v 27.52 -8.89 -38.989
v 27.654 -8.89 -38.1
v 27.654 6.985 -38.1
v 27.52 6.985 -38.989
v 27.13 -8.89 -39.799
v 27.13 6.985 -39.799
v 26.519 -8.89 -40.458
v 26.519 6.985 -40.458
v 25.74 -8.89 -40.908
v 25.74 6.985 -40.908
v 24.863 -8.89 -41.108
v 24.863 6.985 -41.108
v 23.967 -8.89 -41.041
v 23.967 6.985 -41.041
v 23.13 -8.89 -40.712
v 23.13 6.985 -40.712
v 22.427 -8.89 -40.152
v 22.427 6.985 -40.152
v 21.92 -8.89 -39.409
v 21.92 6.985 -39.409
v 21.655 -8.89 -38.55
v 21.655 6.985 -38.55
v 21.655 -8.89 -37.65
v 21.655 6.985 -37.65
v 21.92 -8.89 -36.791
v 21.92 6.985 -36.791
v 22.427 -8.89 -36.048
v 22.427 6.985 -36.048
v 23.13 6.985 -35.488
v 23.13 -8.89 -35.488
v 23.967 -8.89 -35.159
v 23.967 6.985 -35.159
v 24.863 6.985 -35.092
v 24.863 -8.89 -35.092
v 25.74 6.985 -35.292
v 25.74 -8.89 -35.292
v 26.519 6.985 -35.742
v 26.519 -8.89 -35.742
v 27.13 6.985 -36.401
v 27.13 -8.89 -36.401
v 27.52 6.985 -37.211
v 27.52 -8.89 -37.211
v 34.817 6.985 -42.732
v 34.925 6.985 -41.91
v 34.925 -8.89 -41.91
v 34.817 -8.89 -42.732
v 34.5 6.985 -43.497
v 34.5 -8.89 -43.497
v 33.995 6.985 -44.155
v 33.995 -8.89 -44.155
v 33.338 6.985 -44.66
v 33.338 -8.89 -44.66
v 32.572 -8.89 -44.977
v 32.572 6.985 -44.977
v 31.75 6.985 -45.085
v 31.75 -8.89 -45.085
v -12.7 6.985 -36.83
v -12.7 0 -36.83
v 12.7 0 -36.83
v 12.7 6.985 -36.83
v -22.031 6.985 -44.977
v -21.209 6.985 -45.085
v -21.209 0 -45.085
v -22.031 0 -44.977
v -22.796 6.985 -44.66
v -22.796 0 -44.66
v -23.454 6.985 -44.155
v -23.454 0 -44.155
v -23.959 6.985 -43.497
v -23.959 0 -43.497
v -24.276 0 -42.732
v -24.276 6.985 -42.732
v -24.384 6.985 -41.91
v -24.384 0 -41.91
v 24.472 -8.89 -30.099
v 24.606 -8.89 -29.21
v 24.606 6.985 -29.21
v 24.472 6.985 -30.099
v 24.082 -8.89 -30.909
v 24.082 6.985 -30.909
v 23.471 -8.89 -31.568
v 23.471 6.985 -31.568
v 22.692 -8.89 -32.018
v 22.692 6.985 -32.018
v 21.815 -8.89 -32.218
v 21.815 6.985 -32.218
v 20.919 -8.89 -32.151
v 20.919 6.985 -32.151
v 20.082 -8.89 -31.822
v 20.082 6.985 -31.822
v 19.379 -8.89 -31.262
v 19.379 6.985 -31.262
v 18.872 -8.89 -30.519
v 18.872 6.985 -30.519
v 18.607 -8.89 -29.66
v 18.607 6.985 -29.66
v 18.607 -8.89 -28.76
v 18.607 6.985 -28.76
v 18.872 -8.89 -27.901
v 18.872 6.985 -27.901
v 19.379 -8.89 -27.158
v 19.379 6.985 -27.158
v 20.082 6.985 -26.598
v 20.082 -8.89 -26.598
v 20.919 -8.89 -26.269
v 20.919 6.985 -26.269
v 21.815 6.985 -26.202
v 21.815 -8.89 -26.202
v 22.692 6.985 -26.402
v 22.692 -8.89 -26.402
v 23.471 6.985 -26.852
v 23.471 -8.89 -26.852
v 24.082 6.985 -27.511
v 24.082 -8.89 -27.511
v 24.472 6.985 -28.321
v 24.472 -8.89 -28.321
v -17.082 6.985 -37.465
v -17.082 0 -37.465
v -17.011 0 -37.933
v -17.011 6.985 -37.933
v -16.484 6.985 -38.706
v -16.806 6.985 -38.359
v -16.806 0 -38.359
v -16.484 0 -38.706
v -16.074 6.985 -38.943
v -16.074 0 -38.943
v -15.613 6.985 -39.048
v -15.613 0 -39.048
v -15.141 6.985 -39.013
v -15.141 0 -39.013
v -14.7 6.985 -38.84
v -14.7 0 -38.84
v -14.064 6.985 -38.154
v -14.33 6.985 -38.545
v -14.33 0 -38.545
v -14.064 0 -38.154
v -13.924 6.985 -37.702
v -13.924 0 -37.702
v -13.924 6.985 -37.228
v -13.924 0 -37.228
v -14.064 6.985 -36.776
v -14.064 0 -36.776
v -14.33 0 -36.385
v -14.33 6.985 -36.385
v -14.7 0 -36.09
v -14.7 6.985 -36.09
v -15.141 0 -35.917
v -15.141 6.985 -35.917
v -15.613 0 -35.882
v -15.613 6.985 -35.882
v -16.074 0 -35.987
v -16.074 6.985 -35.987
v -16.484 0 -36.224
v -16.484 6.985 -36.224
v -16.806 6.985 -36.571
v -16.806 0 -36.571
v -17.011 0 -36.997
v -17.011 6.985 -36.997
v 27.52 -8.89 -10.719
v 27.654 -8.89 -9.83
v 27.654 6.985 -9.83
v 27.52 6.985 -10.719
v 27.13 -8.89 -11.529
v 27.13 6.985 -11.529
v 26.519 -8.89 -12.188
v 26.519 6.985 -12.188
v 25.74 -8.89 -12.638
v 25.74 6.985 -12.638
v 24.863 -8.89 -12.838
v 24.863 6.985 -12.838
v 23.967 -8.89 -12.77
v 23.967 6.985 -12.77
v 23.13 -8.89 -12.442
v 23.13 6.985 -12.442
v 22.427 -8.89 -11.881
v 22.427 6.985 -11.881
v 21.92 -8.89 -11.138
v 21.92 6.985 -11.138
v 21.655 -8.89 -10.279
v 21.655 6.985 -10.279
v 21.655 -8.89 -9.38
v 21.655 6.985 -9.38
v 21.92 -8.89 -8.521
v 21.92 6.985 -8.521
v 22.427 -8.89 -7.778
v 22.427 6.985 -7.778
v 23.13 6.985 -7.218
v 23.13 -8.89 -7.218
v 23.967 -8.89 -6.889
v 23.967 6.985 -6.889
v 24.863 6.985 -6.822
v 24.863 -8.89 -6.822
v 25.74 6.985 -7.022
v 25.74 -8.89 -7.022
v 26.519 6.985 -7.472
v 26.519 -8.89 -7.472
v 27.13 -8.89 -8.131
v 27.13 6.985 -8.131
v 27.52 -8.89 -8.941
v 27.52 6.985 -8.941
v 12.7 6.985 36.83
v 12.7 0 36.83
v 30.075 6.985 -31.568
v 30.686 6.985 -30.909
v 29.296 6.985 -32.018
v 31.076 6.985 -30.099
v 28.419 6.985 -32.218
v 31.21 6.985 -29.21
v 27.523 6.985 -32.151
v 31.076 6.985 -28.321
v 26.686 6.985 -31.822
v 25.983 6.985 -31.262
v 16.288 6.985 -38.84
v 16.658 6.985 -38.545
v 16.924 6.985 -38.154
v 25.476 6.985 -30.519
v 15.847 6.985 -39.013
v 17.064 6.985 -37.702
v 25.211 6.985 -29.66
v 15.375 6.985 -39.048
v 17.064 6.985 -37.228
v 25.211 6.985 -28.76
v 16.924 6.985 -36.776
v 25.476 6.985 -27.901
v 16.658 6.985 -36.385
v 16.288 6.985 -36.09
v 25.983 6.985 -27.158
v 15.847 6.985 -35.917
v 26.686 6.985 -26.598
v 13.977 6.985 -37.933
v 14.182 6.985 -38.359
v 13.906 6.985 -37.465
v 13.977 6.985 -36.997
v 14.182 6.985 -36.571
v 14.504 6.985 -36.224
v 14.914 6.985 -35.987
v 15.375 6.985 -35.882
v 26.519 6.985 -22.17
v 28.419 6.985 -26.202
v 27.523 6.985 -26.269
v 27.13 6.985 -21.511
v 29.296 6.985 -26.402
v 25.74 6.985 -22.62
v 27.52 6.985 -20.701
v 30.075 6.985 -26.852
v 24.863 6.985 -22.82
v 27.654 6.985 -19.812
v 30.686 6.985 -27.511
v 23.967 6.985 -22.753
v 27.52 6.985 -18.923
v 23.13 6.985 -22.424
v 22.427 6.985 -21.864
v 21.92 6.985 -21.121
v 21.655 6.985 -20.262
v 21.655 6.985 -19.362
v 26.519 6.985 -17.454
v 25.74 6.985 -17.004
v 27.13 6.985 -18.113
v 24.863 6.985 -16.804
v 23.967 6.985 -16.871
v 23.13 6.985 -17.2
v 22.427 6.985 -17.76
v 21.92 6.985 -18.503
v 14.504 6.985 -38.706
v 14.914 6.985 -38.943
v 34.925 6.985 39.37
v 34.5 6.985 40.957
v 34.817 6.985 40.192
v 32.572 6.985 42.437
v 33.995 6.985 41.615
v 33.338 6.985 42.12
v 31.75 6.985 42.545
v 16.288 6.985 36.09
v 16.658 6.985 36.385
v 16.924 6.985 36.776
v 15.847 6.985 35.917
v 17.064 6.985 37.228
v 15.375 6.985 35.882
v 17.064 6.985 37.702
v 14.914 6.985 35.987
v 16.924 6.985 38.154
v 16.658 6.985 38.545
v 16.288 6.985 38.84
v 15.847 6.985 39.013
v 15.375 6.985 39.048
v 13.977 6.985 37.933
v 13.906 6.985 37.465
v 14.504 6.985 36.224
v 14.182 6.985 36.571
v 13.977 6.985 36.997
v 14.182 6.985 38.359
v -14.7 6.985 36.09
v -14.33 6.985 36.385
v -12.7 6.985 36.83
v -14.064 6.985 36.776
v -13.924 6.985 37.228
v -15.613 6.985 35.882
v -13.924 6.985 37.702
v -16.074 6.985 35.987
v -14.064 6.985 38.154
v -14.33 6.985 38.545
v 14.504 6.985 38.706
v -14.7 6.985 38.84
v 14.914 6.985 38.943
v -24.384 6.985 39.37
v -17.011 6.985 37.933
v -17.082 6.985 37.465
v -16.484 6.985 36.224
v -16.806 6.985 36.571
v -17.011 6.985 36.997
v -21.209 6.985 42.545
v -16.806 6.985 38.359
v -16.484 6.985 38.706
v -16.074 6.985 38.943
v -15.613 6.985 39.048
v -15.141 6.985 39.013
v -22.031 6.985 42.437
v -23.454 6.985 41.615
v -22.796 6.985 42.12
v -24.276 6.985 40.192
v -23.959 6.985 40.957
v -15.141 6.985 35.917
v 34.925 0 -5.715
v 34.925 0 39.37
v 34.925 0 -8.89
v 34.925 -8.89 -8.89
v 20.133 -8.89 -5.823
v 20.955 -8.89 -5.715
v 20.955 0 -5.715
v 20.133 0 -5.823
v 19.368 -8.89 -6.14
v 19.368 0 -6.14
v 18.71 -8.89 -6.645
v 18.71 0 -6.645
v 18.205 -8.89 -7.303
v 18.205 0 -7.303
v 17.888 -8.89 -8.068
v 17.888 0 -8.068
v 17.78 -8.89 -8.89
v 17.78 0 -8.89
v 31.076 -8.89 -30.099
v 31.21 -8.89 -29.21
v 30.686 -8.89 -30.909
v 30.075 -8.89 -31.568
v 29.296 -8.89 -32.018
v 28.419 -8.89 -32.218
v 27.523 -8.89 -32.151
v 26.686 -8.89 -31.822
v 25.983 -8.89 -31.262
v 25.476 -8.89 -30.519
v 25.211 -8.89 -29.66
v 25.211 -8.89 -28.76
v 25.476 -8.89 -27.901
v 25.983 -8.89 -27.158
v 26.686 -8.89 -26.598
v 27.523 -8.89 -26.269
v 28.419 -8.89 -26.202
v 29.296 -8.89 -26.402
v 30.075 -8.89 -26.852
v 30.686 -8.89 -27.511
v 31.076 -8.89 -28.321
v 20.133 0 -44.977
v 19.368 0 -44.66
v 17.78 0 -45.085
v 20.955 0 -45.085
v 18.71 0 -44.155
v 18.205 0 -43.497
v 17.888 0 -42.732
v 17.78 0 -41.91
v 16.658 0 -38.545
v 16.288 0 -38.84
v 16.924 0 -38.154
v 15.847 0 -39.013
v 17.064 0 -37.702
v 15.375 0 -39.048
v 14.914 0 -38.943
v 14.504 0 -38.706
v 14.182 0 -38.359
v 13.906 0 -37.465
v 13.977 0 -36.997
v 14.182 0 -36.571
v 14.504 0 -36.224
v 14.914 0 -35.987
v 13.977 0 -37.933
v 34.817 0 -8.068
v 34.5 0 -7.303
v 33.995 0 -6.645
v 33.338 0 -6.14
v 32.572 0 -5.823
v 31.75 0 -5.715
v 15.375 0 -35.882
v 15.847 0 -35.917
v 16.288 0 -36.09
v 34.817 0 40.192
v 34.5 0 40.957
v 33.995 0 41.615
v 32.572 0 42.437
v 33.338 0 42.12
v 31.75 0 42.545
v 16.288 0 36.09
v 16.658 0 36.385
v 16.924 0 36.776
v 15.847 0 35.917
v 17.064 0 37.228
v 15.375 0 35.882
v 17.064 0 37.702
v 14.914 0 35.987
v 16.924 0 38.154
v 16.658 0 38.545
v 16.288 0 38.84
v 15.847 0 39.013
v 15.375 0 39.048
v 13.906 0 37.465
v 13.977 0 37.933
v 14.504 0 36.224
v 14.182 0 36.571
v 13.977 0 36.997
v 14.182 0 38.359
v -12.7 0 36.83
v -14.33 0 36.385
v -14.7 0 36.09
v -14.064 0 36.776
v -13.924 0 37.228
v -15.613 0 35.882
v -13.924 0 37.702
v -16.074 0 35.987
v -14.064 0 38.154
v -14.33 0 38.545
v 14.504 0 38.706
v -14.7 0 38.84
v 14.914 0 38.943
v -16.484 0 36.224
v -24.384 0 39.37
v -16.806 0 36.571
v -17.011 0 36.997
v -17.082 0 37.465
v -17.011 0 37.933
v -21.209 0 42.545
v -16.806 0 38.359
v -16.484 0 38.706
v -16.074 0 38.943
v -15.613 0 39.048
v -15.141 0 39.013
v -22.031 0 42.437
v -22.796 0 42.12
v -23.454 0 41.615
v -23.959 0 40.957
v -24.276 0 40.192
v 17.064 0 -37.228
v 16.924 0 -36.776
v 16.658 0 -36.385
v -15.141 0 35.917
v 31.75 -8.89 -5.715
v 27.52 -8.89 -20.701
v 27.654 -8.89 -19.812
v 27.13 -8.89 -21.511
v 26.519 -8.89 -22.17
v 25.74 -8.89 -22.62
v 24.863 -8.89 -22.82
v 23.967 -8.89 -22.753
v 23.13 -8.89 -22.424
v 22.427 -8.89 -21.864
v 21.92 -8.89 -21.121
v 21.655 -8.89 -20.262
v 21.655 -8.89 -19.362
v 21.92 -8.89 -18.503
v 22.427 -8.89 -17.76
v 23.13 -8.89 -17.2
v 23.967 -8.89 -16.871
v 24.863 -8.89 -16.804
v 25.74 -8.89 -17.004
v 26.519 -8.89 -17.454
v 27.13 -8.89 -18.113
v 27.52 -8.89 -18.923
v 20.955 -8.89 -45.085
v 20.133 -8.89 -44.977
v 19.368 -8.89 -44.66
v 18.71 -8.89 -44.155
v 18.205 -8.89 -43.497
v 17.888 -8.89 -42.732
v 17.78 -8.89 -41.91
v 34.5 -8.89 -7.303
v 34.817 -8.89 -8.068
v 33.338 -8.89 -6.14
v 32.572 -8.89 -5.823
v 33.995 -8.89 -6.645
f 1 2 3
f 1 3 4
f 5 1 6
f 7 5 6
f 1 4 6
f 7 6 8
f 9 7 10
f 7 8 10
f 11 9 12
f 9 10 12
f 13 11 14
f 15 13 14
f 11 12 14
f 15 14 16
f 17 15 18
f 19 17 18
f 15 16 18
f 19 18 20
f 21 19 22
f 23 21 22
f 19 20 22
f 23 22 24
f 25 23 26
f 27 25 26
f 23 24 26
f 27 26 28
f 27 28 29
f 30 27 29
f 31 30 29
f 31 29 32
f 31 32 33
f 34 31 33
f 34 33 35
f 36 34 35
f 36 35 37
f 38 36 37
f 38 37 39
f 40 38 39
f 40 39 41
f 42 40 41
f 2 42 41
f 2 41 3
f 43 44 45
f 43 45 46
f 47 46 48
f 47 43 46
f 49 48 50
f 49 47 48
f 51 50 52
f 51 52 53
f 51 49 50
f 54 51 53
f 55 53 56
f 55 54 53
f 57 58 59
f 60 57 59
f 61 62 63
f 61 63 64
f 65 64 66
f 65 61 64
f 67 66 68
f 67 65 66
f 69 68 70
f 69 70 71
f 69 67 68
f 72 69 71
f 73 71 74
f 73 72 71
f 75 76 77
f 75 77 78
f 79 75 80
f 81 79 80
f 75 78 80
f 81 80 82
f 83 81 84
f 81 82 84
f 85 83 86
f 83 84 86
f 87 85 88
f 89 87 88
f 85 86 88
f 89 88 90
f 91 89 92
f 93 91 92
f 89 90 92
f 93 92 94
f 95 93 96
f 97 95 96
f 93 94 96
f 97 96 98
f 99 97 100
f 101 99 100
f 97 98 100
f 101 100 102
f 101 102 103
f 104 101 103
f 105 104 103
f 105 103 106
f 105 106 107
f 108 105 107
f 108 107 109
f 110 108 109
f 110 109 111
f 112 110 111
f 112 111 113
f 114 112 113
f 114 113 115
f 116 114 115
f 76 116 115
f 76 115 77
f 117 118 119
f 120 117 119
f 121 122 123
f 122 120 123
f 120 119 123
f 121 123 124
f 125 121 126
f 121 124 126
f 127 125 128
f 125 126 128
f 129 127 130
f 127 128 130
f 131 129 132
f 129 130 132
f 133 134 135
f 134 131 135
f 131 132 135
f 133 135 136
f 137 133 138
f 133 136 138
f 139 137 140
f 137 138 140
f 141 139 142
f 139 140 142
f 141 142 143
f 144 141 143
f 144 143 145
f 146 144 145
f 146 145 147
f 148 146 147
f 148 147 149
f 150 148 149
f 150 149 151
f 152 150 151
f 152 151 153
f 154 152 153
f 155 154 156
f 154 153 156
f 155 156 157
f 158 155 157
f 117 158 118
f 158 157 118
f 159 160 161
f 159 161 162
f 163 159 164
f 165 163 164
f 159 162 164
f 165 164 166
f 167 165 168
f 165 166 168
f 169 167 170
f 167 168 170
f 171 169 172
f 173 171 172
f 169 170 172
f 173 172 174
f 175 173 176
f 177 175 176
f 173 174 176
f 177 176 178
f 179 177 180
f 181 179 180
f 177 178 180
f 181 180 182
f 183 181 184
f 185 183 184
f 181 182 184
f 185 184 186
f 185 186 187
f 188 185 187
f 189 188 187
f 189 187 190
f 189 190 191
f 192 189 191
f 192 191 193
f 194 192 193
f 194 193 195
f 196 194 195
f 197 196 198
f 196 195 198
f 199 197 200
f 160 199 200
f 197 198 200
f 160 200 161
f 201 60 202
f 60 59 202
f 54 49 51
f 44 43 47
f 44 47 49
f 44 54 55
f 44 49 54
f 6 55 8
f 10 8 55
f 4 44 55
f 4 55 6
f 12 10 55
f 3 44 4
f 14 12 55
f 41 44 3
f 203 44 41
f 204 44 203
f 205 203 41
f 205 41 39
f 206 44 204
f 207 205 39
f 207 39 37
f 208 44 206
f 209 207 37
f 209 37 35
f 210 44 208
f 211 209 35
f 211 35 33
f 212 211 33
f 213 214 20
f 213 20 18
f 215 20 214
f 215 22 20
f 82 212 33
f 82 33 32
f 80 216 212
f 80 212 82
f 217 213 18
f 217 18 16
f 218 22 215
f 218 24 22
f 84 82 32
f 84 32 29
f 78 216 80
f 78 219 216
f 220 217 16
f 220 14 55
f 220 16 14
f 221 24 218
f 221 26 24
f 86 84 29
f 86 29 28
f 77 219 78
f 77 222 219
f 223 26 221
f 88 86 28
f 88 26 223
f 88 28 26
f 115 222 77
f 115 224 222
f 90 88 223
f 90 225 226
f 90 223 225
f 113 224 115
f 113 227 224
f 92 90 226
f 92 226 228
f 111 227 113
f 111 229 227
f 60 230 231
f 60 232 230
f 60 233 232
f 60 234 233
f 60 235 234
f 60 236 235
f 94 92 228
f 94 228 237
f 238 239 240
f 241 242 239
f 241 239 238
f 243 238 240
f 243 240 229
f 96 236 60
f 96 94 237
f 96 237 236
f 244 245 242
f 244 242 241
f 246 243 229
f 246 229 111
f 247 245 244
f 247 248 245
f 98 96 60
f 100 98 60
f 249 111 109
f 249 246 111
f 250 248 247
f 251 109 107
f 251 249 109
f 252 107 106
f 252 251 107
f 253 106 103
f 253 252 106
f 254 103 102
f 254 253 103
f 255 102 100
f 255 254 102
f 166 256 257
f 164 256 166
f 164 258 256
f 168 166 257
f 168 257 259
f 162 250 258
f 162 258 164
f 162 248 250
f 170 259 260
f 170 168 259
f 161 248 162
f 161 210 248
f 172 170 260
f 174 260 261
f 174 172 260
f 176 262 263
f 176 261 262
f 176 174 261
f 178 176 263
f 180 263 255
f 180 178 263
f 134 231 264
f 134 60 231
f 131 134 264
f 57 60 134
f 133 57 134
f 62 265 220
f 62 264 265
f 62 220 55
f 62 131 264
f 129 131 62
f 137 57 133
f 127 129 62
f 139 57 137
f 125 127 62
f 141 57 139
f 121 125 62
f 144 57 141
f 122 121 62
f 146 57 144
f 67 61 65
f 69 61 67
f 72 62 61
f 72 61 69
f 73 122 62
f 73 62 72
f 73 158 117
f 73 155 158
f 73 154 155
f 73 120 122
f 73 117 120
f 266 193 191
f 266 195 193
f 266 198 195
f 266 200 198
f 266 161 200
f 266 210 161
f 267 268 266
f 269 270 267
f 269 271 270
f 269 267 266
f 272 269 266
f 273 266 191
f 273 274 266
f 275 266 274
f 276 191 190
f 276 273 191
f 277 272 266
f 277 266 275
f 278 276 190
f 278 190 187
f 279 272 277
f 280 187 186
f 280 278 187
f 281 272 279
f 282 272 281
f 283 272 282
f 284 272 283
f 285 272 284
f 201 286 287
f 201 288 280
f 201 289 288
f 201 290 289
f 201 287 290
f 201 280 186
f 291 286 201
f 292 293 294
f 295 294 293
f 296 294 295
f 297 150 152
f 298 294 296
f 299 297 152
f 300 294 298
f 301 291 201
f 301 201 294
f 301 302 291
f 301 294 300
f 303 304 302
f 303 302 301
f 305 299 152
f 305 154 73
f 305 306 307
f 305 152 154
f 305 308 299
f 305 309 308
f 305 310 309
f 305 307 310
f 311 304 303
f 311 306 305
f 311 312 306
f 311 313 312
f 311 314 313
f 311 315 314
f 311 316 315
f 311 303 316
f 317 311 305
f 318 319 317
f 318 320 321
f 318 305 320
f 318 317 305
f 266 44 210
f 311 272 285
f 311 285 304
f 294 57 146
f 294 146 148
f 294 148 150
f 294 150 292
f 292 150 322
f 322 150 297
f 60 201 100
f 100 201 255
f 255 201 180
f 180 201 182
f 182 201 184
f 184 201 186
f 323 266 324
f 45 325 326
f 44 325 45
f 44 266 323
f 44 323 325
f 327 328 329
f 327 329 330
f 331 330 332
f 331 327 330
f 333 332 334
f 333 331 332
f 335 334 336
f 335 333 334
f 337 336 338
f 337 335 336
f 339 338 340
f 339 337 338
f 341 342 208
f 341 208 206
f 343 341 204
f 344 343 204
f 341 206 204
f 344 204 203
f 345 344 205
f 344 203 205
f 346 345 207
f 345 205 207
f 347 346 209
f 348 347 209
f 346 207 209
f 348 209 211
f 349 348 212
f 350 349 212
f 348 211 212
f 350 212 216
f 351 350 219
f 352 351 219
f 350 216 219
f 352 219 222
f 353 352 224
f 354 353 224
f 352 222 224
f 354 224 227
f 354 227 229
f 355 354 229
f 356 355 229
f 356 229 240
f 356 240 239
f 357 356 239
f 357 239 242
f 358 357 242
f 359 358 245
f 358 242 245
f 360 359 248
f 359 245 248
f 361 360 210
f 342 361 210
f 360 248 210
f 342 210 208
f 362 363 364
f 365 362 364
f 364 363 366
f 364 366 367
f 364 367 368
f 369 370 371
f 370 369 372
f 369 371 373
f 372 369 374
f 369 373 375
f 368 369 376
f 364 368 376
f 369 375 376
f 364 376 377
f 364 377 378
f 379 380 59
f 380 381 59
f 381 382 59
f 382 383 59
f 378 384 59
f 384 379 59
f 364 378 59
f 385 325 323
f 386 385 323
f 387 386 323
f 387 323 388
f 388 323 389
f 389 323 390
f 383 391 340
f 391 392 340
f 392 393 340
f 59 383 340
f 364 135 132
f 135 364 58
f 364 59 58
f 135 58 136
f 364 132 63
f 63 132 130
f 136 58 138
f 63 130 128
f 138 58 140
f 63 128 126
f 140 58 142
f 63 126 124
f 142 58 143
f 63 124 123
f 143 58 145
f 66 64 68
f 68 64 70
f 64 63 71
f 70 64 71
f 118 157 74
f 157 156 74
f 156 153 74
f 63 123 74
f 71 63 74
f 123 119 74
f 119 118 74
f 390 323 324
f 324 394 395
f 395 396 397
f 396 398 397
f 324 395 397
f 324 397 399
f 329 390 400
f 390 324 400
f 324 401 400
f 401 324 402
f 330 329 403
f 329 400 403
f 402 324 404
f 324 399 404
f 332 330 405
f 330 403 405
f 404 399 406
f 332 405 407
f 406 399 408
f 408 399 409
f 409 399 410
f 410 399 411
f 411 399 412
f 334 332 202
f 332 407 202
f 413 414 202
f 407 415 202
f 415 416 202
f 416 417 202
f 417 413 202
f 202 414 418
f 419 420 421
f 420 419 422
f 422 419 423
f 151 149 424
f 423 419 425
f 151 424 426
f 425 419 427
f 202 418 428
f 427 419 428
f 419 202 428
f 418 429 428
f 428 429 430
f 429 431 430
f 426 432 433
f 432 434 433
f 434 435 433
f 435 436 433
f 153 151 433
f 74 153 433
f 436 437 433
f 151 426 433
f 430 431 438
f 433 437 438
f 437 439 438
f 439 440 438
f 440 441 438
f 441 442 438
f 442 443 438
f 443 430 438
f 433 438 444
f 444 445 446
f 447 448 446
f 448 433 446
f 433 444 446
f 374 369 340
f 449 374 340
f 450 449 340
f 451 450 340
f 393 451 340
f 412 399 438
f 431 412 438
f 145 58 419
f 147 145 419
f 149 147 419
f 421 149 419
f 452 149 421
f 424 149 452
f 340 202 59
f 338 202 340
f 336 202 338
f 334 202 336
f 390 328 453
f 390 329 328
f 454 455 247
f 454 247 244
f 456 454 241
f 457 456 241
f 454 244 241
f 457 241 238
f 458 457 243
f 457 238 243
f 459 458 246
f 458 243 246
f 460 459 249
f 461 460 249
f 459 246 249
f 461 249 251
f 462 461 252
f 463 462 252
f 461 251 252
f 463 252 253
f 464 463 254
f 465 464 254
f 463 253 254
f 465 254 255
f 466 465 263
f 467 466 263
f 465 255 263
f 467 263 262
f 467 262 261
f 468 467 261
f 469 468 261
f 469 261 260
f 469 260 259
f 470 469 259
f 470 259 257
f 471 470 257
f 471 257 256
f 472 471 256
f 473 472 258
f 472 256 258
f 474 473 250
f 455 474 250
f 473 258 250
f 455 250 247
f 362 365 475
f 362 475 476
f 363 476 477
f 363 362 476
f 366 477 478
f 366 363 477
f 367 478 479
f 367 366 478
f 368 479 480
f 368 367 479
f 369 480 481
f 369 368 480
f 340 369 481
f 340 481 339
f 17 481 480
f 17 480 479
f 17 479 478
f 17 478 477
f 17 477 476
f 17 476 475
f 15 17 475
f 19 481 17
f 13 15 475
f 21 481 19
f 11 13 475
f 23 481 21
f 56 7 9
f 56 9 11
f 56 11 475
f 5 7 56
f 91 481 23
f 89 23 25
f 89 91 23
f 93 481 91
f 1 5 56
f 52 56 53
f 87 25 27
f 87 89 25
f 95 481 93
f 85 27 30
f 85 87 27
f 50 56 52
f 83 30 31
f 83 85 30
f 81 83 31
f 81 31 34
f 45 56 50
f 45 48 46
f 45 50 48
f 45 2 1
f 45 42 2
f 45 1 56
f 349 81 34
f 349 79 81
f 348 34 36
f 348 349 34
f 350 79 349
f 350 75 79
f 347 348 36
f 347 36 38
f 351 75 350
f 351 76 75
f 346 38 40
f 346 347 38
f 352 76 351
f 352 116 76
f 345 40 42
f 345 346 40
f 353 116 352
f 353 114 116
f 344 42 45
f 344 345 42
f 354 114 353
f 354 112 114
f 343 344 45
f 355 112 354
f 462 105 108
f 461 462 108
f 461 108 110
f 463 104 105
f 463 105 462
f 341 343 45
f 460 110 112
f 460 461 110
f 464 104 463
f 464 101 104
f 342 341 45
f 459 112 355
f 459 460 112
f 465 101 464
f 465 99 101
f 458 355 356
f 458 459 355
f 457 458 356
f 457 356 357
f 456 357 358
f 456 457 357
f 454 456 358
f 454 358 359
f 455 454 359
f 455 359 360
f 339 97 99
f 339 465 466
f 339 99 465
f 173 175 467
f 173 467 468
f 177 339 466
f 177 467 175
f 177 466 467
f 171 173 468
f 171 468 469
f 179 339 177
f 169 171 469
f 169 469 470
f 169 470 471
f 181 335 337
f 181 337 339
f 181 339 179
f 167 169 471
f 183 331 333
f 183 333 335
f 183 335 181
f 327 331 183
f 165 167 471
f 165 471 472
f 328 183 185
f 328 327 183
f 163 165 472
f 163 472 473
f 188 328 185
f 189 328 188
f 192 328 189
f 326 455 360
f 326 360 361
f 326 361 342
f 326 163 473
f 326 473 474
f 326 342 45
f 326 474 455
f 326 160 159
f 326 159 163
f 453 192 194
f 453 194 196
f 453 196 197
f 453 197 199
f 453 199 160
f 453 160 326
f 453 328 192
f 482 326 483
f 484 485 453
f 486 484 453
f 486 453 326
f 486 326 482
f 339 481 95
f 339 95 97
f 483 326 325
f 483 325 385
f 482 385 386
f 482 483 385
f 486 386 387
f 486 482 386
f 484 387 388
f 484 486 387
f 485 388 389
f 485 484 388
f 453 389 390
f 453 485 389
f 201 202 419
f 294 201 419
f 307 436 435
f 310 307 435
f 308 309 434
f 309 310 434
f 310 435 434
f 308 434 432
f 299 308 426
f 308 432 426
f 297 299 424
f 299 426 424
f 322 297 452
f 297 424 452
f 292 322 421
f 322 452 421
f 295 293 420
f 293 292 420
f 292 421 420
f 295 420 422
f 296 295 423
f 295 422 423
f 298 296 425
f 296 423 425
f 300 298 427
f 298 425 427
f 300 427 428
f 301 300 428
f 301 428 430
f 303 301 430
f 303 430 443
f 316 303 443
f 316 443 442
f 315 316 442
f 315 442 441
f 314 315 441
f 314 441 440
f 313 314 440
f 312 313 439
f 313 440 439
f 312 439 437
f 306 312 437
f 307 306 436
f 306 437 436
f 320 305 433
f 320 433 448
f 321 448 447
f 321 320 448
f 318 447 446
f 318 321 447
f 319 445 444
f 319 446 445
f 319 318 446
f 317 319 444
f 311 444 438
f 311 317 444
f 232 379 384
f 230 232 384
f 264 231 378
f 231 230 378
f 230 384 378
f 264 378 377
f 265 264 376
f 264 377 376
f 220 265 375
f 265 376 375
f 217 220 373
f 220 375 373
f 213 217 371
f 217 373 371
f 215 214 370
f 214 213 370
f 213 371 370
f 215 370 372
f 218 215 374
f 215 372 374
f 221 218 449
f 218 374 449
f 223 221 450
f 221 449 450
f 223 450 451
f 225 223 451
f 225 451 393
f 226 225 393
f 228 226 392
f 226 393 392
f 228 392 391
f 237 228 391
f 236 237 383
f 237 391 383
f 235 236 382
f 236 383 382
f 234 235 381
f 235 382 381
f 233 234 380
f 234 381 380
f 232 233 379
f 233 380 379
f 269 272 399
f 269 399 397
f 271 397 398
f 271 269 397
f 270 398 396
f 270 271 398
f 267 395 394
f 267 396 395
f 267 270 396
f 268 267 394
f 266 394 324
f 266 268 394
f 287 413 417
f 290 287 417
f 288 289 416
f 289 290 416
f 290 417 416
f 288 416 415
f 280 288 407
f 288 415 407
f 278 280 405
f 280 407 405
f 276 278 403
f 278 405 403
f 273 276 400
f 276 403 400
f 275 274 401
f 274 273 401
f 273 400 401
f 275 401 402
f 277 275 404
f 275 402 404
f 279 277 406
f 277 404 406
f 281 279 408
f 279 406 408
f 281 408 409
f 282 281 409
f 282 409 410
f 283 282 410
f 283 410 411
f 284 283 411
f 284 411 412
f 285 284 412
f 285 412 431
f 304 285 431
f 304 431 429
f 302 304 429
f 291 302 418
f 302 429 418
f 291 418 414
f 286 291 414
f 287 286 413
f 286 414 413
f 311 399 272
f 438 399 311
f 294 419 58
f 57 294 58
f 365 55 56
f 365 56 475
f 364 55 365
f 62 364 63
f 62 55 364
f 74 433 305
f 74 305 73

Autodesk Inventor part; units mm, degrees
ref_plane "YZ Plane" through (0, 0, 0) normal (1, 0, 0) x (0, 1, 0)
ref_plane "XZ Plane" through (0, 0, 0) normal (0, 1, 0) x (-1, 0, 0)
ref_plane "XY Plane" through (0, 0, 0) normal (0, 0, 1) x (1, 0, 0)
sketch "Sketch1" plane through (0, 0, 0) normal (0, 1, 0) x (-1, 0, 0)
  line L0 (-24.384, 42.545) -> (24.384, 42.545)
  line L1 (24.384, 42.545) -> (24.384, -42.545)
  line L2 (24.384, -42.545) -> (-24.384, -42.545)
  line L3 (-24.384, -42.545) -> (-24.384, 42.545)
  line L4 (-24.384, 42.545) -> (24.384, -42.545) construction
  line L5 (24.384, 42.545) -> (-24.384, -42.545) construction
  line L6 (-12.7, 36.83) -> (12.7, 36.83)
  line L7 (12.7, 36.83) -> (12.7, -36.83)
  line L8 (12.7, -36.83) -> (-12.7, -36.83)
  line L9 (-12.7, -36.83) -> (-12.7, 36.83)
  line L10 (-12.7, 36.83) -> (12.7, -36.83) construction
  line L11 (12.7, 36.83) -> (-12.7, -36.83) construction
  line L12 (-24.384, 42.545) -> (-34.925, 42.545)
  line L13 (-34.925, 42.545) -> (-34.925, -42.545)
  line L14 (-34.925, -42.545) -> (-24.384, -42.545)
  line L15 (-24.384, -42.545) -> (-24.384, 42.545)
  circle A0 centre (15.494, 37.465) radius 1.5875
  circle A1 centre (-15.494, 37.465) radius 1.5875
  circle A2 centre (-15.494, -37.465) radius 1.5875
  circle A3 centre (15.494, -37.465) radius 1.5875
  point P0 (0, 0)
  dimension "d0" = 73.66
  dimension "d1" = 25.4
  dimension "d4" = 85.09
  dimension "d5" = 34.925
  dimension "d6" = 59.309
  dimension "d7" = 3.175
  dimension "d8" = 3.175
  dimension "d9" = 3.175
  dimension "d10" = 3.175
  dimension "d11" = 5.08
  dimension "d12" = 8.89
  dimension "d13" = 5.08
  dimension "d14" = 19.431
extrude "Extrusion1" add sketch "Sketch1" along normal blind 6.985
sketch "Sketch3" plane through (0, 0, 0) normal (0, -1, 0) x (1, 0, 0)
  line L0 (34.925, 42.545) -> (34.925, -42.545) projected
  line L1 (34.925, -42.545) -> (17.78, -42.545)
  line L2 (17.78, -42.545) -> (17.78, -5.715)
  line L3 (17.78, -5.715) -> (34.925, -5.715)
  line L4 (34.925, -5.715) -> (34.925, -42.545)
  point P0 (0, 0)
  point P1 (34.925, -5.715)
  dimension "d31" = 36.83
  dimension "d32" = 17.145
extrude "Extrusion3" add sketch "Sketch3" along normal blind 8.89
sketch "Sketch2" plane through (0, 6.985, 0) normal (0, 1, 0) x (1, 0, 0)
  circle A0 centre (21.59, 29.21) radius 3.0162
  circle A1 centre (28.194, 29.21) radius 3.0162
  circle A2 centre (24.638, 38.1) radius 3.0162
  circle A3 centre (24.638, 19.812) radius 3.0162
  line L0 (34.925, -42.545) -> (34.925, 42.545) projected
  circle A4 centre (24.638, 9.8298) radius 3.0162
  line L1 (34.925, 42.545) -> (-24.384, 42.545) projected
  point P0 (0, 0)
  dimension "d17" = 6.0325
  dimension "d18" = 6.0325
  dimension "d19" = 6.0325
  dimension "d20" = 6.0325
  dimension "d21" = 6.731
  dimension "d22" = 10.287
  dimension "d23" = 13.335
  dimension "d24" = 6.0325
  dimension "d25" = 4.445
  dimension "d26" = 18.288
  dimension "d27" = 8.89
  dimension "d28" = 28.2702
extrude "Extrusion2" cut sketch "Sketch2" against normal through all
sketch "Sketch7" plane through (-24.384, 0, -42.545) normal (0, 0, -1) x (-1, 0, 0)
  line L0 (-59.309, 6.985) -> (0, 6.985) projected
  line L1 (0, 0) -> (-59.309, 0) projected
  line L2 (0, 6.985) -> (-59.309, 6.985)
  line L3 (-59.309, 6.985) -> (-59.309, 0)
  line L4 (-59.309, 0) -> (0, 0)
  line L5 (0, 0) -> (0, 6.985)
  line L6 (-42.164, -8.89) -> (-59.309, -8.89) projected
  line L7 (-59.309, -8.89) -> (-42.164, -8.89)
  line L8 (-42.164, -8.89) -> (-42.164, 0)
  line L9 (-42.164, 0) -> (-59.309, 0)
  line L10 (-59.309, 0) -> (-59.309, -8.89)
  point P0 (-24.384, 0)
  point P1 (-45.4299, 3.81)
  point P2 (-45.4299, 3.81)
extrude "Extrusion5" add sketch "Sketch7" along normal blind 2.54
sketch "Sketch4" plane through (0, 6.985, 0) normal (0, 1, 0) x (1, 0, 0)
  circle A0 centre (21.59, 29.21) radius 3.0162 projected
  circle A1 centre (21.59, 29.21) radius 5.715
  circle A2 centre (24.638, 38.1) radius 3.0162 projected
  circle A3 centre (24.638, 38.1) radius 5.715
  circle A4 centre (28.194, 29.21) radius 3.0162 projected
  circle A5 centre (24.638, 19.812) radius 3.0162 projected
  circle A6 centre (24.638, 19.812) radius 5.715
  circle A7 centre (24.638, 9.8298) radius 3.0162 projected
  circle A8 centre (24.638, 9.8298) radius 5.715
  circle A9 centre (28.194, 29.21) radius 5.715
  point P0 (0, 0)
  point P1 (24.892, 24.5455)
  point P2 (24.892, 33.8745)
  point P3 (23.8684, 25.4749)
  point P4 (23.108, 26.6036)
  point P5 (23.108, 31.8164)
  point P6 (23.518, 32.4958)
  point P7 (20.037, 34.71)
  point P8 (20.3805, 23.6245)
  point P9 (28.9636, 23.5471)
  point P10 (29.314, 34.8142)
  point P11 (26.191, 32.6)
  point P12 (26.676, 31.8164)
  point P13 (26.676, 26.6036)
  point P14 (25.8475, 25.3975)
  point P15 (21.8541, 14.8209)
  point P16 (27.4219, 14.8209)
  dimension "d35" = 11.43
  dimension "d36" = 11.43
  dimension "d37" = 11.43
  dimension "d38" = 11.43
  dimension "d39" = 11.43
fillet "Fillet1" radius 3.175 7 edges at (-24.384, 3.4925, 42.545) (34.925, 3.4925, 42.545) (34.925, -0.9525, -45.085) (-24.384, 3.4925, -45.085) (17.78, -4.445, -45.085) (17.78, -4.445, -5.715) (34.925, -4.445, -5.715)
equation "\"d8\" = d7"
equation "\"d9\" = d7"
equation "\"d10\" = d7"
equation "\"d18\" = d17"
equation "\"d19\" = d17"
equation "\"d20\" = d17"
equation "\"d24\" = d17"
equation "\"d36\" = d35"
equation "\"d37\" = d35"
equation "\"d38\" = d35"
equation "\"d39\" = d35"
properties part number "Button_Plate"
